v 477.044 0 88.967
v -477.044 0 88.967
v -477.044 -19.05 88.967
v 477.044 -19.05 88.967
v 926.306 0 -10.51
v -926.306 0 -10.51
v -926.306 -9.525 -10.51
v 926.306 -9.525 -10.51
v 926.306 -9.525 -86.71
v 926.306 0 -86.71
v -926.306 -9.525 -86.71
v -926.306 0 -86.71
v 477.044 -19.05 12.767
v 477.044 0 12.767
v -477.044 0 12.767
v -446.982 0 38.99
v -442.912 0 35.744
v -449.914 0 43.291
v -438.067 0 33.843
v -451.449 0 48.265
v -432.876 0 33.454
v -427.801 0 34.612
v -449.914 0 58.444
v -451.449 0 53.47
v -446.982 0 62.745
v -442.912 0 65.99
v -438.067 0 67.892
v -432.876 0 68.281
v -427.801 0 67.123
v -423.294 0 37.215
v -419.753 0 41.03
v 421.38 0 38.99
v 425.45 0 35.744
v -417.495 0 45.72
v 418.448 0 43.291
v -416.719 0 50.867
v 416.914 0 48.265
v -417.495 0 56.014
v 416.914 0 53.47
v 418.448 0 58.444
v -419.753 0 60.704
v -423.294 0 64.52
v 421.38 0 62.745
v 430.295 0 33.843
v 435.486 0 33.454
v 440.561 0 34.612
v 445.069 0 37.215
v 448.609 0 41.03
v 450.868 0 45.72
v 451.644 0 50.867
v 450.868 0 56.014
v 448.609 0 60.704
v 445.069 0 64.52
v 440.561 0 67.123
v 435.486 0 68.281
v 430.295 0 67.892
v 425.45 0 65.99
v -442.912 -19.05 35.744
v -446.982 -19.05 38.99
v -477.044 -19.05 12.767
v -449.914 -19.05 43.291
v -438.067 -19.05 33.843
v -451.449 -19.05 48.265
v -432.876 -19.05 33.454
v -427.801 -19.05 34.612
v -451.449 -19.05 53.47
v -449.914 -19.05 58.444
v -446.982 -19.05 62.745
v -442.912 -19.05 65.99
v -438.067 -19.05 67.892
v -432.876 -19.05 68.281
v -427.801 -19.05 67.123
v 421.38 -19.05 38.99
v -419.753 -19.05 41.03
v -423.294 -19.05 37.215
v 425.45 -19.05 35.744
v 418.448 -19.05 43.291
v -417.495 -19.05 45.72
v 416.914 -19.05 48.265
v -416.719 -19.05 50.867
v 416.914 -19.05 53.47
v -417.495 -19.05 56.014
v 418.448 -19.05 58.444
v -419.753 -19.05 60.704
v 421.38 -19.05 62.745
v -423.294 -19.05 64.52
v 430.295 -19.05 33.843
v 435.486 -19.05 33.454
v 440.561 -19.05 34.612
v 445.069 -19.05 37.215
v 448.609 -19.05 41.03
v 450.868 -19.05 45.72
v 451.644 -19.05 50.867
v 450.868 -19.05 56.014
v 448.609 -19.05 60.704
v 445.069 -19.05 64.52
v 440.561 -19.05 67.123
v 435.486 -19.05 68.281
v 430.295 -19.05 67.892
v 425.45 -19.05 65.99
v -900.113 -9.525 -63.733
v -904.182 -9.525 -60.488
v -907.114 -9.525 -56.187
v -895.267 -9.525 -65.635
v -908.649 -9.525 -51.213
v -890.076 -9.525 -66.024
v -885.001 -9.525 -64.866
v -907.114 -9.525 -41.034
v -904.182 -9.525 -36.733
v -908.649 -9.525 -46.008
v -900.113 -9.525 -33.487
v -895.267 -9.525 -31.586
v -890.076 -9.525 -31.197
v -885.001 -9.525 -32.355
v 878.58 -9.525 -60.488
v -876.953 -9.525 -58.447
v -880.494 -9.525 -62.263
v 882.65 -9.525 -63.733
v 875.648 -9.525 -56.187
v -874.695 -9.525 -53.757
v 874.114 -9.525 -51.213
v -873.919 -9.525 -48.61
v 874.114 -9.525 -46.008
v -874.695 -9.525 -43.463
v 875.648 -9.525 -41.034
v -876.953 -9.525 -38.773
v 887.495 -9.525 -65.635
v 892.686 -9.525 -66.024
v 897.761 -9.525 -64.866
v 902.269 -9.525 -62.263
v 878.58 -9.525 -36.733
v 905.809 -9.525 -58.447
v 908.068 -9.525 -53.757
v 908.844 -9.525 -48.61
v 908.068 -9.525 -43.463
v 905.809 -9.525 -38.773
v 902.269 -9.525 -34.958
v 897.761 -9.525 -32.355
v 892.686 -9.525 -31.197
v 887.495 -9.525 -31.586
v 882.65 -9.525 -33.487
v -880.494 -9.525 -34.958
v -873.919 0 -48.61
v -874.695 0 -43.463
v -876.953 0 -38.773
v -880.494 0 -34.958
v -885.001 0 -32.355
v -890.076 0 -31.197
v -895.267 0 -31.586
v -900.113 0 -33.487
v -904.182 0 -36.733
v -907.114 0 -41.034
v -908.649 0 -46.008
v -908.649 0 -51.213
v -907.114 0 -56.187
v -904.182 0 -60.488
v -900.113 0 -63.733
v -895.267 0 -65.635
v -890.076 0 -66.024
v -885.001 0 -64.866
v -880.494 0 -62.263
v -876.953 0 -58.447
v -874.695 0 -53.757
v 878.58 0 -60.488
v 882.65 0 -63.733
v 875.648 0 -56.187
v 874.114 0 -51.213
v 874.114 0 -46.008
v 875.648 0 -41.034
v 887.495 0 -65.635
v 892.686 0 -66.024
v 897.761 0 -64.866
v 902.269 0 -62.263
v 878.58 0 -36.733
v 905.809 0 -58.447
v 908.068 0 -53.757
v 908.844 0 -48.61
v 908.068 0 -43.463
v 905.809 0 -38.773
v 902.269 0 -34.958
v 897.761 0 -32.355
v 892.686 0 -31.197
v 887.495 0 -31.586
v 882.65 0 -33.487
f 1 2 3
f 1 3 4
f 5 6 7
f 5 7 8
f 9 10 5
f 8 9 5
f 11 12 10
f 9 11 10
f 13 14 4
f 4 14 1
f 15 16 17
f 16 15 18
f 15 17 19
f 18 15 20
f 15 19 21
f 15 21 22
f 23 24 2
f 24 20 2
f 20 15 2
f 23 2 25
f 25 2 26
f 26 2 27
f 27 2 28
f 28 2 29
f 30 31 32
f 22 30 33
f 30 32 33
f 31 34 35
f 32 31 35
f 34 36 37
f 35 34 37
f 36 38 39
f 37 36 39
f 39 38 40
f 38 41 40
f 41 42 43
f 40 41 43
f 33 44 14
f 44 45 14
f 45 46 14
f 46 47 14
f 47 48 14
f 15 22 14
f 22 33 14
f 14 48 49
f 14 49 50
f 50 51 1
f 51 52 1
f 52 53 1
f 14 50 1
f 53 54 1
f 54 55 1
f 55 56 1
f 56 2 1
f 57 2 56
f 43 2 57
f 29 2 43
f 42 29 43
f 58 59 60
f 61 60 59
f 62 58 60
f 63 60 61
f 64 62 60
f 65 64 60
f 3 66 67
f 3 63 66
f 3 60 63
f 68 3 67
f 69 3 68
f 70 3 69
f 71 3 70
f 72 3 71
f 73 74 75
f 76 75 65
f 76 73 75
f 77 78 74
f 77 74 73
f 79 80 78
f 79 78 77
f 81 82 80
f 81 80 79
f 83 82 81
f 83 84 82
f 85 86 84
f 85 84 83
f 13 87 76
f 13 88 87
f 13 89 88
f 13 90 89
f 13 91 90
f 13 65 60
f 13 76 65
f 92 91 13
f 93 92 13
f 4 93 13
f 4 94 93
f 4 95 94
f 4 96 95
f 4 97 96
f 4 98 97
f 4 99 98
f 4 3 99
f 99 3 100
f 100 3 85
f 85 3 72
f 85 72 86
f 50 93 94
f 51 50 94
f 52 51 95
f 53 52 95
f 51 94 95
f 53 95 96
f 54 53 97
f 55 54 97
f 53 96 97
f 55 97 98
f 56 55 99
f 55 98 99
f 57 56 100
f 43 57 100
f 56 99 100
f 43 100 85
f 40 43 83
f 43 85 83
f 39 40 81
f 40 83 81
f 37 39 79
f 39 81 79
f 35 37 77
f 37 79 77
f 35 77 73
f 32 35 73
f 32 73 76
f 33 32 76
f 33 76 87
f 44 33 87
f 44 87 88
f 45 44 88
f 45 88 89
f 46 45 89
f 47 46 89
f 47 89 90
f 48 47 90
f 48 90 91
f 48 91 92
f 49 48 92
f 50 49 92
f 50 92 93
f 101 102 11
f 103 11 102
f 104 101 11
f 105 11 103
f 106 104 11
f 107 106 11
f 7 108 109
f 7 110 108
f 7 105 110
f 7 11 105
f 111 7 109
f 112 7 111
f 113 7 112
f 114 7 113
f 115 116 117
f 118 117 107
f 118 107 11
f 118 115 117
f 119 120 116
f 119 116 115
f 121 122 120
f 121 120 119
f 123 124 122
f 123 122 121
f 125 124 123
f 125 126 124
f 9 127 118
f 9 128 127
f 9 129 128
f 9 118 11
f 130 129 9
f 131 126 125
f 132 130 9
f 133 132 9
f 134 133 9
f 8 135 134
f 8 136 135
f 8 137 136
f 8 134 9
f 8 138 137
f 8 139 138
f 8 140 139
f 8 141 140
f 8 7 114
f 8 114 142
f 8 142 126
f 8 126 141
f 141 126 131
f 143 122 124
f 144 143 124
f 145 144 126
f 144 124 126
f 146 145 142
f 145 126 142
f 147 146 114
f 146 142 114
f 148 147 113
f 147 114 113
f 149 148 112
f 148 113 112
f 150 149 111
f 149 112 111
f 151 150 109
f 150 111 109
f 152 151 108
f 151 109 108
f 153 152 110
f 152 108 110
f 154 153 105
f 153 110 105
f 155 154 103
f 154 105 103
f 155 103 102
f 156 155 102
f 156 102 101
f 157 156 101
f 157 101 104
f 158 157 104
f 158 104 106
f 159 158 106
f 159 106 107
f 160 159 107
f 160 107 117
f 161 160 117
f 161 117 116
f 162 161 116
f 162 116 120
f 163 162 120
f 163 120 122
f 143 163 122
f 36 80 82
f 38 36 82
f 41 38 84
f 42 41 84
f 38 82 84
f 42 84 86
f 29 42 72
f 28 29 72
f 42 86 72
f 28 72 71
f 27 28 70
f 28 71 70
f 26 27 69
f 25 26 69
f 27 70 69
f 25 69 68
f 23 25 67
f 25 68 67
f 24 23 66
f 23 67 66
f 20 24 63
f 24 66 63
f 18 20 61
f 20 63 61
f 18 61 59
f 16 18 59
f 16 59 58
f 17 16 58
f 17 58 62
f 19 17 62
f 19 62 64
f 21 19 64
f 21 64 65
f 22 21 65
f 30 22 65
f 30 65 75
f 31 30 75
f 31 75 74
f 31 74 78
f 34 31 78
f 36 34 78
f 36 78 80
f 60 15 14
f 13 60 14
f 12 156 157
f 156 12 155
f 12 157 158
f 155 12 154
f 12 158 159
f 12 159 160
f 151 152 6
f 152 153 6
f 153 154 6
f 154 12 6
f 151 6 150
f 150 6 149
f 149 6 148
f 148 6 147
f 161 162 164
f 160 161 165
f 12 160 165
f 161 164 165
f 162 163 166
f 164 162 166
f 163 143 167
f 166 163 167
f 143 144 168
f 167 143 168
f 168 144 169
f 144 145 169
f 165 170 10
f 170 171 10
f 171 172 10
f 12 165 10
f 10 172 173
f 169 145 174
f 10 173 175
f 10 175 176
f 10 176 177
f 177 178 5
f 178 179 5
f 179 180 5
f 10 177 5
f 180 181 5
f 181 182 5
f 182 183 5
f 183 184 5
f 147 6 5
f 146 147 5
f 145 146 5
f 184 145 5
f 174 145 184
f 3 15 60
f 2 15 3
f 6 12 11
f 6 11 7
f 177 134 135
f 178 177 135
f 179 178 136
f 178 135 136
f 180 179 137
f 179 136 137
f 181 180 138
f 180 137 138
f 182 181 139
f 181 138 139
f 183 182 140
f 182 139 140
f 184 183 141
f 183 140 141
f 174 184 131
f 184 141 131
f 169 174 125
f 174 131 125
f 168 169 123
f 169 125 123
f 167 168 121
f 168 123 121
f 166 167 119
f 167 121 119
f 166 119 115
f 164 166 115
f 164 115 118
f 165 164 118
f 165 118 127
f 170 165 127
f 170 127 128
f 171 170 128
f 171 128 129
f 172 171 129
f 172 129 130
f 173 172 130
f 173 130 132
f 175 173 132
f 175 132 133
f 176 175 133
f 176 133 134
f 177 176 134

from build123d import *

# Parameters (mm, degrees)
F0_W     = 954.0875
F0_H     = 76.2
F2_DEPTH = 19.05
F1_W     = 1852.6125
F1_H     = 76.2
F3_DEPTH = 9.525
F4_R     = 17.4625
F5_DEPTH = 19.051


with BuildPart() as f2:
    # F0 (on Front) → F2 (new body)
    with BuildSketch(Plane.XZ):
        with Locations((0, 50.867289)):
            Rectangle(F0_W, F0_H)
    extrude(amount=F2_DEPTH)


with BuildPart() as f3:
    # F1 (on Front) → F3 (new body)
    with BuildSketch(Plane.XZ):
        with Locations((0, -48.610255)):
            Rectangle(F1_W, F1_H)
    extrude(amount=F3_DEPTH)


with BuildPart() as f5_tool:
    # F4 (on face) → F5 (new body, through all)
    with BuildSketch(Plane.XZ.offset(19.05)):
        with Locations((-434.18125, 50.867289)):
            Circle(F4_R)
        with Locations((434.18125, 50.867289)):
            Circle(F4_R)
        with Locations((891.38125, -48.610255)):
            Circle(F4_R)
        with Locations((-891.38125, -48.610255)):
            Circle(F4_R)
    extrude(amount=-F5_DEPTH)


with BuildPart() as f2_1:
    add(f2.part)

    # F5: cut by f5_tool
    add(f5_tool.part, mode=Mode.SUBTRACT)


with BuildPart() as f3_1:
    add(f3.part)

    # F5: cut by f5_tool
    add(f5_tool.part, mode=Mode.SUBTRACT)


solid = Compound([f2_1.part, f3_1.part])
